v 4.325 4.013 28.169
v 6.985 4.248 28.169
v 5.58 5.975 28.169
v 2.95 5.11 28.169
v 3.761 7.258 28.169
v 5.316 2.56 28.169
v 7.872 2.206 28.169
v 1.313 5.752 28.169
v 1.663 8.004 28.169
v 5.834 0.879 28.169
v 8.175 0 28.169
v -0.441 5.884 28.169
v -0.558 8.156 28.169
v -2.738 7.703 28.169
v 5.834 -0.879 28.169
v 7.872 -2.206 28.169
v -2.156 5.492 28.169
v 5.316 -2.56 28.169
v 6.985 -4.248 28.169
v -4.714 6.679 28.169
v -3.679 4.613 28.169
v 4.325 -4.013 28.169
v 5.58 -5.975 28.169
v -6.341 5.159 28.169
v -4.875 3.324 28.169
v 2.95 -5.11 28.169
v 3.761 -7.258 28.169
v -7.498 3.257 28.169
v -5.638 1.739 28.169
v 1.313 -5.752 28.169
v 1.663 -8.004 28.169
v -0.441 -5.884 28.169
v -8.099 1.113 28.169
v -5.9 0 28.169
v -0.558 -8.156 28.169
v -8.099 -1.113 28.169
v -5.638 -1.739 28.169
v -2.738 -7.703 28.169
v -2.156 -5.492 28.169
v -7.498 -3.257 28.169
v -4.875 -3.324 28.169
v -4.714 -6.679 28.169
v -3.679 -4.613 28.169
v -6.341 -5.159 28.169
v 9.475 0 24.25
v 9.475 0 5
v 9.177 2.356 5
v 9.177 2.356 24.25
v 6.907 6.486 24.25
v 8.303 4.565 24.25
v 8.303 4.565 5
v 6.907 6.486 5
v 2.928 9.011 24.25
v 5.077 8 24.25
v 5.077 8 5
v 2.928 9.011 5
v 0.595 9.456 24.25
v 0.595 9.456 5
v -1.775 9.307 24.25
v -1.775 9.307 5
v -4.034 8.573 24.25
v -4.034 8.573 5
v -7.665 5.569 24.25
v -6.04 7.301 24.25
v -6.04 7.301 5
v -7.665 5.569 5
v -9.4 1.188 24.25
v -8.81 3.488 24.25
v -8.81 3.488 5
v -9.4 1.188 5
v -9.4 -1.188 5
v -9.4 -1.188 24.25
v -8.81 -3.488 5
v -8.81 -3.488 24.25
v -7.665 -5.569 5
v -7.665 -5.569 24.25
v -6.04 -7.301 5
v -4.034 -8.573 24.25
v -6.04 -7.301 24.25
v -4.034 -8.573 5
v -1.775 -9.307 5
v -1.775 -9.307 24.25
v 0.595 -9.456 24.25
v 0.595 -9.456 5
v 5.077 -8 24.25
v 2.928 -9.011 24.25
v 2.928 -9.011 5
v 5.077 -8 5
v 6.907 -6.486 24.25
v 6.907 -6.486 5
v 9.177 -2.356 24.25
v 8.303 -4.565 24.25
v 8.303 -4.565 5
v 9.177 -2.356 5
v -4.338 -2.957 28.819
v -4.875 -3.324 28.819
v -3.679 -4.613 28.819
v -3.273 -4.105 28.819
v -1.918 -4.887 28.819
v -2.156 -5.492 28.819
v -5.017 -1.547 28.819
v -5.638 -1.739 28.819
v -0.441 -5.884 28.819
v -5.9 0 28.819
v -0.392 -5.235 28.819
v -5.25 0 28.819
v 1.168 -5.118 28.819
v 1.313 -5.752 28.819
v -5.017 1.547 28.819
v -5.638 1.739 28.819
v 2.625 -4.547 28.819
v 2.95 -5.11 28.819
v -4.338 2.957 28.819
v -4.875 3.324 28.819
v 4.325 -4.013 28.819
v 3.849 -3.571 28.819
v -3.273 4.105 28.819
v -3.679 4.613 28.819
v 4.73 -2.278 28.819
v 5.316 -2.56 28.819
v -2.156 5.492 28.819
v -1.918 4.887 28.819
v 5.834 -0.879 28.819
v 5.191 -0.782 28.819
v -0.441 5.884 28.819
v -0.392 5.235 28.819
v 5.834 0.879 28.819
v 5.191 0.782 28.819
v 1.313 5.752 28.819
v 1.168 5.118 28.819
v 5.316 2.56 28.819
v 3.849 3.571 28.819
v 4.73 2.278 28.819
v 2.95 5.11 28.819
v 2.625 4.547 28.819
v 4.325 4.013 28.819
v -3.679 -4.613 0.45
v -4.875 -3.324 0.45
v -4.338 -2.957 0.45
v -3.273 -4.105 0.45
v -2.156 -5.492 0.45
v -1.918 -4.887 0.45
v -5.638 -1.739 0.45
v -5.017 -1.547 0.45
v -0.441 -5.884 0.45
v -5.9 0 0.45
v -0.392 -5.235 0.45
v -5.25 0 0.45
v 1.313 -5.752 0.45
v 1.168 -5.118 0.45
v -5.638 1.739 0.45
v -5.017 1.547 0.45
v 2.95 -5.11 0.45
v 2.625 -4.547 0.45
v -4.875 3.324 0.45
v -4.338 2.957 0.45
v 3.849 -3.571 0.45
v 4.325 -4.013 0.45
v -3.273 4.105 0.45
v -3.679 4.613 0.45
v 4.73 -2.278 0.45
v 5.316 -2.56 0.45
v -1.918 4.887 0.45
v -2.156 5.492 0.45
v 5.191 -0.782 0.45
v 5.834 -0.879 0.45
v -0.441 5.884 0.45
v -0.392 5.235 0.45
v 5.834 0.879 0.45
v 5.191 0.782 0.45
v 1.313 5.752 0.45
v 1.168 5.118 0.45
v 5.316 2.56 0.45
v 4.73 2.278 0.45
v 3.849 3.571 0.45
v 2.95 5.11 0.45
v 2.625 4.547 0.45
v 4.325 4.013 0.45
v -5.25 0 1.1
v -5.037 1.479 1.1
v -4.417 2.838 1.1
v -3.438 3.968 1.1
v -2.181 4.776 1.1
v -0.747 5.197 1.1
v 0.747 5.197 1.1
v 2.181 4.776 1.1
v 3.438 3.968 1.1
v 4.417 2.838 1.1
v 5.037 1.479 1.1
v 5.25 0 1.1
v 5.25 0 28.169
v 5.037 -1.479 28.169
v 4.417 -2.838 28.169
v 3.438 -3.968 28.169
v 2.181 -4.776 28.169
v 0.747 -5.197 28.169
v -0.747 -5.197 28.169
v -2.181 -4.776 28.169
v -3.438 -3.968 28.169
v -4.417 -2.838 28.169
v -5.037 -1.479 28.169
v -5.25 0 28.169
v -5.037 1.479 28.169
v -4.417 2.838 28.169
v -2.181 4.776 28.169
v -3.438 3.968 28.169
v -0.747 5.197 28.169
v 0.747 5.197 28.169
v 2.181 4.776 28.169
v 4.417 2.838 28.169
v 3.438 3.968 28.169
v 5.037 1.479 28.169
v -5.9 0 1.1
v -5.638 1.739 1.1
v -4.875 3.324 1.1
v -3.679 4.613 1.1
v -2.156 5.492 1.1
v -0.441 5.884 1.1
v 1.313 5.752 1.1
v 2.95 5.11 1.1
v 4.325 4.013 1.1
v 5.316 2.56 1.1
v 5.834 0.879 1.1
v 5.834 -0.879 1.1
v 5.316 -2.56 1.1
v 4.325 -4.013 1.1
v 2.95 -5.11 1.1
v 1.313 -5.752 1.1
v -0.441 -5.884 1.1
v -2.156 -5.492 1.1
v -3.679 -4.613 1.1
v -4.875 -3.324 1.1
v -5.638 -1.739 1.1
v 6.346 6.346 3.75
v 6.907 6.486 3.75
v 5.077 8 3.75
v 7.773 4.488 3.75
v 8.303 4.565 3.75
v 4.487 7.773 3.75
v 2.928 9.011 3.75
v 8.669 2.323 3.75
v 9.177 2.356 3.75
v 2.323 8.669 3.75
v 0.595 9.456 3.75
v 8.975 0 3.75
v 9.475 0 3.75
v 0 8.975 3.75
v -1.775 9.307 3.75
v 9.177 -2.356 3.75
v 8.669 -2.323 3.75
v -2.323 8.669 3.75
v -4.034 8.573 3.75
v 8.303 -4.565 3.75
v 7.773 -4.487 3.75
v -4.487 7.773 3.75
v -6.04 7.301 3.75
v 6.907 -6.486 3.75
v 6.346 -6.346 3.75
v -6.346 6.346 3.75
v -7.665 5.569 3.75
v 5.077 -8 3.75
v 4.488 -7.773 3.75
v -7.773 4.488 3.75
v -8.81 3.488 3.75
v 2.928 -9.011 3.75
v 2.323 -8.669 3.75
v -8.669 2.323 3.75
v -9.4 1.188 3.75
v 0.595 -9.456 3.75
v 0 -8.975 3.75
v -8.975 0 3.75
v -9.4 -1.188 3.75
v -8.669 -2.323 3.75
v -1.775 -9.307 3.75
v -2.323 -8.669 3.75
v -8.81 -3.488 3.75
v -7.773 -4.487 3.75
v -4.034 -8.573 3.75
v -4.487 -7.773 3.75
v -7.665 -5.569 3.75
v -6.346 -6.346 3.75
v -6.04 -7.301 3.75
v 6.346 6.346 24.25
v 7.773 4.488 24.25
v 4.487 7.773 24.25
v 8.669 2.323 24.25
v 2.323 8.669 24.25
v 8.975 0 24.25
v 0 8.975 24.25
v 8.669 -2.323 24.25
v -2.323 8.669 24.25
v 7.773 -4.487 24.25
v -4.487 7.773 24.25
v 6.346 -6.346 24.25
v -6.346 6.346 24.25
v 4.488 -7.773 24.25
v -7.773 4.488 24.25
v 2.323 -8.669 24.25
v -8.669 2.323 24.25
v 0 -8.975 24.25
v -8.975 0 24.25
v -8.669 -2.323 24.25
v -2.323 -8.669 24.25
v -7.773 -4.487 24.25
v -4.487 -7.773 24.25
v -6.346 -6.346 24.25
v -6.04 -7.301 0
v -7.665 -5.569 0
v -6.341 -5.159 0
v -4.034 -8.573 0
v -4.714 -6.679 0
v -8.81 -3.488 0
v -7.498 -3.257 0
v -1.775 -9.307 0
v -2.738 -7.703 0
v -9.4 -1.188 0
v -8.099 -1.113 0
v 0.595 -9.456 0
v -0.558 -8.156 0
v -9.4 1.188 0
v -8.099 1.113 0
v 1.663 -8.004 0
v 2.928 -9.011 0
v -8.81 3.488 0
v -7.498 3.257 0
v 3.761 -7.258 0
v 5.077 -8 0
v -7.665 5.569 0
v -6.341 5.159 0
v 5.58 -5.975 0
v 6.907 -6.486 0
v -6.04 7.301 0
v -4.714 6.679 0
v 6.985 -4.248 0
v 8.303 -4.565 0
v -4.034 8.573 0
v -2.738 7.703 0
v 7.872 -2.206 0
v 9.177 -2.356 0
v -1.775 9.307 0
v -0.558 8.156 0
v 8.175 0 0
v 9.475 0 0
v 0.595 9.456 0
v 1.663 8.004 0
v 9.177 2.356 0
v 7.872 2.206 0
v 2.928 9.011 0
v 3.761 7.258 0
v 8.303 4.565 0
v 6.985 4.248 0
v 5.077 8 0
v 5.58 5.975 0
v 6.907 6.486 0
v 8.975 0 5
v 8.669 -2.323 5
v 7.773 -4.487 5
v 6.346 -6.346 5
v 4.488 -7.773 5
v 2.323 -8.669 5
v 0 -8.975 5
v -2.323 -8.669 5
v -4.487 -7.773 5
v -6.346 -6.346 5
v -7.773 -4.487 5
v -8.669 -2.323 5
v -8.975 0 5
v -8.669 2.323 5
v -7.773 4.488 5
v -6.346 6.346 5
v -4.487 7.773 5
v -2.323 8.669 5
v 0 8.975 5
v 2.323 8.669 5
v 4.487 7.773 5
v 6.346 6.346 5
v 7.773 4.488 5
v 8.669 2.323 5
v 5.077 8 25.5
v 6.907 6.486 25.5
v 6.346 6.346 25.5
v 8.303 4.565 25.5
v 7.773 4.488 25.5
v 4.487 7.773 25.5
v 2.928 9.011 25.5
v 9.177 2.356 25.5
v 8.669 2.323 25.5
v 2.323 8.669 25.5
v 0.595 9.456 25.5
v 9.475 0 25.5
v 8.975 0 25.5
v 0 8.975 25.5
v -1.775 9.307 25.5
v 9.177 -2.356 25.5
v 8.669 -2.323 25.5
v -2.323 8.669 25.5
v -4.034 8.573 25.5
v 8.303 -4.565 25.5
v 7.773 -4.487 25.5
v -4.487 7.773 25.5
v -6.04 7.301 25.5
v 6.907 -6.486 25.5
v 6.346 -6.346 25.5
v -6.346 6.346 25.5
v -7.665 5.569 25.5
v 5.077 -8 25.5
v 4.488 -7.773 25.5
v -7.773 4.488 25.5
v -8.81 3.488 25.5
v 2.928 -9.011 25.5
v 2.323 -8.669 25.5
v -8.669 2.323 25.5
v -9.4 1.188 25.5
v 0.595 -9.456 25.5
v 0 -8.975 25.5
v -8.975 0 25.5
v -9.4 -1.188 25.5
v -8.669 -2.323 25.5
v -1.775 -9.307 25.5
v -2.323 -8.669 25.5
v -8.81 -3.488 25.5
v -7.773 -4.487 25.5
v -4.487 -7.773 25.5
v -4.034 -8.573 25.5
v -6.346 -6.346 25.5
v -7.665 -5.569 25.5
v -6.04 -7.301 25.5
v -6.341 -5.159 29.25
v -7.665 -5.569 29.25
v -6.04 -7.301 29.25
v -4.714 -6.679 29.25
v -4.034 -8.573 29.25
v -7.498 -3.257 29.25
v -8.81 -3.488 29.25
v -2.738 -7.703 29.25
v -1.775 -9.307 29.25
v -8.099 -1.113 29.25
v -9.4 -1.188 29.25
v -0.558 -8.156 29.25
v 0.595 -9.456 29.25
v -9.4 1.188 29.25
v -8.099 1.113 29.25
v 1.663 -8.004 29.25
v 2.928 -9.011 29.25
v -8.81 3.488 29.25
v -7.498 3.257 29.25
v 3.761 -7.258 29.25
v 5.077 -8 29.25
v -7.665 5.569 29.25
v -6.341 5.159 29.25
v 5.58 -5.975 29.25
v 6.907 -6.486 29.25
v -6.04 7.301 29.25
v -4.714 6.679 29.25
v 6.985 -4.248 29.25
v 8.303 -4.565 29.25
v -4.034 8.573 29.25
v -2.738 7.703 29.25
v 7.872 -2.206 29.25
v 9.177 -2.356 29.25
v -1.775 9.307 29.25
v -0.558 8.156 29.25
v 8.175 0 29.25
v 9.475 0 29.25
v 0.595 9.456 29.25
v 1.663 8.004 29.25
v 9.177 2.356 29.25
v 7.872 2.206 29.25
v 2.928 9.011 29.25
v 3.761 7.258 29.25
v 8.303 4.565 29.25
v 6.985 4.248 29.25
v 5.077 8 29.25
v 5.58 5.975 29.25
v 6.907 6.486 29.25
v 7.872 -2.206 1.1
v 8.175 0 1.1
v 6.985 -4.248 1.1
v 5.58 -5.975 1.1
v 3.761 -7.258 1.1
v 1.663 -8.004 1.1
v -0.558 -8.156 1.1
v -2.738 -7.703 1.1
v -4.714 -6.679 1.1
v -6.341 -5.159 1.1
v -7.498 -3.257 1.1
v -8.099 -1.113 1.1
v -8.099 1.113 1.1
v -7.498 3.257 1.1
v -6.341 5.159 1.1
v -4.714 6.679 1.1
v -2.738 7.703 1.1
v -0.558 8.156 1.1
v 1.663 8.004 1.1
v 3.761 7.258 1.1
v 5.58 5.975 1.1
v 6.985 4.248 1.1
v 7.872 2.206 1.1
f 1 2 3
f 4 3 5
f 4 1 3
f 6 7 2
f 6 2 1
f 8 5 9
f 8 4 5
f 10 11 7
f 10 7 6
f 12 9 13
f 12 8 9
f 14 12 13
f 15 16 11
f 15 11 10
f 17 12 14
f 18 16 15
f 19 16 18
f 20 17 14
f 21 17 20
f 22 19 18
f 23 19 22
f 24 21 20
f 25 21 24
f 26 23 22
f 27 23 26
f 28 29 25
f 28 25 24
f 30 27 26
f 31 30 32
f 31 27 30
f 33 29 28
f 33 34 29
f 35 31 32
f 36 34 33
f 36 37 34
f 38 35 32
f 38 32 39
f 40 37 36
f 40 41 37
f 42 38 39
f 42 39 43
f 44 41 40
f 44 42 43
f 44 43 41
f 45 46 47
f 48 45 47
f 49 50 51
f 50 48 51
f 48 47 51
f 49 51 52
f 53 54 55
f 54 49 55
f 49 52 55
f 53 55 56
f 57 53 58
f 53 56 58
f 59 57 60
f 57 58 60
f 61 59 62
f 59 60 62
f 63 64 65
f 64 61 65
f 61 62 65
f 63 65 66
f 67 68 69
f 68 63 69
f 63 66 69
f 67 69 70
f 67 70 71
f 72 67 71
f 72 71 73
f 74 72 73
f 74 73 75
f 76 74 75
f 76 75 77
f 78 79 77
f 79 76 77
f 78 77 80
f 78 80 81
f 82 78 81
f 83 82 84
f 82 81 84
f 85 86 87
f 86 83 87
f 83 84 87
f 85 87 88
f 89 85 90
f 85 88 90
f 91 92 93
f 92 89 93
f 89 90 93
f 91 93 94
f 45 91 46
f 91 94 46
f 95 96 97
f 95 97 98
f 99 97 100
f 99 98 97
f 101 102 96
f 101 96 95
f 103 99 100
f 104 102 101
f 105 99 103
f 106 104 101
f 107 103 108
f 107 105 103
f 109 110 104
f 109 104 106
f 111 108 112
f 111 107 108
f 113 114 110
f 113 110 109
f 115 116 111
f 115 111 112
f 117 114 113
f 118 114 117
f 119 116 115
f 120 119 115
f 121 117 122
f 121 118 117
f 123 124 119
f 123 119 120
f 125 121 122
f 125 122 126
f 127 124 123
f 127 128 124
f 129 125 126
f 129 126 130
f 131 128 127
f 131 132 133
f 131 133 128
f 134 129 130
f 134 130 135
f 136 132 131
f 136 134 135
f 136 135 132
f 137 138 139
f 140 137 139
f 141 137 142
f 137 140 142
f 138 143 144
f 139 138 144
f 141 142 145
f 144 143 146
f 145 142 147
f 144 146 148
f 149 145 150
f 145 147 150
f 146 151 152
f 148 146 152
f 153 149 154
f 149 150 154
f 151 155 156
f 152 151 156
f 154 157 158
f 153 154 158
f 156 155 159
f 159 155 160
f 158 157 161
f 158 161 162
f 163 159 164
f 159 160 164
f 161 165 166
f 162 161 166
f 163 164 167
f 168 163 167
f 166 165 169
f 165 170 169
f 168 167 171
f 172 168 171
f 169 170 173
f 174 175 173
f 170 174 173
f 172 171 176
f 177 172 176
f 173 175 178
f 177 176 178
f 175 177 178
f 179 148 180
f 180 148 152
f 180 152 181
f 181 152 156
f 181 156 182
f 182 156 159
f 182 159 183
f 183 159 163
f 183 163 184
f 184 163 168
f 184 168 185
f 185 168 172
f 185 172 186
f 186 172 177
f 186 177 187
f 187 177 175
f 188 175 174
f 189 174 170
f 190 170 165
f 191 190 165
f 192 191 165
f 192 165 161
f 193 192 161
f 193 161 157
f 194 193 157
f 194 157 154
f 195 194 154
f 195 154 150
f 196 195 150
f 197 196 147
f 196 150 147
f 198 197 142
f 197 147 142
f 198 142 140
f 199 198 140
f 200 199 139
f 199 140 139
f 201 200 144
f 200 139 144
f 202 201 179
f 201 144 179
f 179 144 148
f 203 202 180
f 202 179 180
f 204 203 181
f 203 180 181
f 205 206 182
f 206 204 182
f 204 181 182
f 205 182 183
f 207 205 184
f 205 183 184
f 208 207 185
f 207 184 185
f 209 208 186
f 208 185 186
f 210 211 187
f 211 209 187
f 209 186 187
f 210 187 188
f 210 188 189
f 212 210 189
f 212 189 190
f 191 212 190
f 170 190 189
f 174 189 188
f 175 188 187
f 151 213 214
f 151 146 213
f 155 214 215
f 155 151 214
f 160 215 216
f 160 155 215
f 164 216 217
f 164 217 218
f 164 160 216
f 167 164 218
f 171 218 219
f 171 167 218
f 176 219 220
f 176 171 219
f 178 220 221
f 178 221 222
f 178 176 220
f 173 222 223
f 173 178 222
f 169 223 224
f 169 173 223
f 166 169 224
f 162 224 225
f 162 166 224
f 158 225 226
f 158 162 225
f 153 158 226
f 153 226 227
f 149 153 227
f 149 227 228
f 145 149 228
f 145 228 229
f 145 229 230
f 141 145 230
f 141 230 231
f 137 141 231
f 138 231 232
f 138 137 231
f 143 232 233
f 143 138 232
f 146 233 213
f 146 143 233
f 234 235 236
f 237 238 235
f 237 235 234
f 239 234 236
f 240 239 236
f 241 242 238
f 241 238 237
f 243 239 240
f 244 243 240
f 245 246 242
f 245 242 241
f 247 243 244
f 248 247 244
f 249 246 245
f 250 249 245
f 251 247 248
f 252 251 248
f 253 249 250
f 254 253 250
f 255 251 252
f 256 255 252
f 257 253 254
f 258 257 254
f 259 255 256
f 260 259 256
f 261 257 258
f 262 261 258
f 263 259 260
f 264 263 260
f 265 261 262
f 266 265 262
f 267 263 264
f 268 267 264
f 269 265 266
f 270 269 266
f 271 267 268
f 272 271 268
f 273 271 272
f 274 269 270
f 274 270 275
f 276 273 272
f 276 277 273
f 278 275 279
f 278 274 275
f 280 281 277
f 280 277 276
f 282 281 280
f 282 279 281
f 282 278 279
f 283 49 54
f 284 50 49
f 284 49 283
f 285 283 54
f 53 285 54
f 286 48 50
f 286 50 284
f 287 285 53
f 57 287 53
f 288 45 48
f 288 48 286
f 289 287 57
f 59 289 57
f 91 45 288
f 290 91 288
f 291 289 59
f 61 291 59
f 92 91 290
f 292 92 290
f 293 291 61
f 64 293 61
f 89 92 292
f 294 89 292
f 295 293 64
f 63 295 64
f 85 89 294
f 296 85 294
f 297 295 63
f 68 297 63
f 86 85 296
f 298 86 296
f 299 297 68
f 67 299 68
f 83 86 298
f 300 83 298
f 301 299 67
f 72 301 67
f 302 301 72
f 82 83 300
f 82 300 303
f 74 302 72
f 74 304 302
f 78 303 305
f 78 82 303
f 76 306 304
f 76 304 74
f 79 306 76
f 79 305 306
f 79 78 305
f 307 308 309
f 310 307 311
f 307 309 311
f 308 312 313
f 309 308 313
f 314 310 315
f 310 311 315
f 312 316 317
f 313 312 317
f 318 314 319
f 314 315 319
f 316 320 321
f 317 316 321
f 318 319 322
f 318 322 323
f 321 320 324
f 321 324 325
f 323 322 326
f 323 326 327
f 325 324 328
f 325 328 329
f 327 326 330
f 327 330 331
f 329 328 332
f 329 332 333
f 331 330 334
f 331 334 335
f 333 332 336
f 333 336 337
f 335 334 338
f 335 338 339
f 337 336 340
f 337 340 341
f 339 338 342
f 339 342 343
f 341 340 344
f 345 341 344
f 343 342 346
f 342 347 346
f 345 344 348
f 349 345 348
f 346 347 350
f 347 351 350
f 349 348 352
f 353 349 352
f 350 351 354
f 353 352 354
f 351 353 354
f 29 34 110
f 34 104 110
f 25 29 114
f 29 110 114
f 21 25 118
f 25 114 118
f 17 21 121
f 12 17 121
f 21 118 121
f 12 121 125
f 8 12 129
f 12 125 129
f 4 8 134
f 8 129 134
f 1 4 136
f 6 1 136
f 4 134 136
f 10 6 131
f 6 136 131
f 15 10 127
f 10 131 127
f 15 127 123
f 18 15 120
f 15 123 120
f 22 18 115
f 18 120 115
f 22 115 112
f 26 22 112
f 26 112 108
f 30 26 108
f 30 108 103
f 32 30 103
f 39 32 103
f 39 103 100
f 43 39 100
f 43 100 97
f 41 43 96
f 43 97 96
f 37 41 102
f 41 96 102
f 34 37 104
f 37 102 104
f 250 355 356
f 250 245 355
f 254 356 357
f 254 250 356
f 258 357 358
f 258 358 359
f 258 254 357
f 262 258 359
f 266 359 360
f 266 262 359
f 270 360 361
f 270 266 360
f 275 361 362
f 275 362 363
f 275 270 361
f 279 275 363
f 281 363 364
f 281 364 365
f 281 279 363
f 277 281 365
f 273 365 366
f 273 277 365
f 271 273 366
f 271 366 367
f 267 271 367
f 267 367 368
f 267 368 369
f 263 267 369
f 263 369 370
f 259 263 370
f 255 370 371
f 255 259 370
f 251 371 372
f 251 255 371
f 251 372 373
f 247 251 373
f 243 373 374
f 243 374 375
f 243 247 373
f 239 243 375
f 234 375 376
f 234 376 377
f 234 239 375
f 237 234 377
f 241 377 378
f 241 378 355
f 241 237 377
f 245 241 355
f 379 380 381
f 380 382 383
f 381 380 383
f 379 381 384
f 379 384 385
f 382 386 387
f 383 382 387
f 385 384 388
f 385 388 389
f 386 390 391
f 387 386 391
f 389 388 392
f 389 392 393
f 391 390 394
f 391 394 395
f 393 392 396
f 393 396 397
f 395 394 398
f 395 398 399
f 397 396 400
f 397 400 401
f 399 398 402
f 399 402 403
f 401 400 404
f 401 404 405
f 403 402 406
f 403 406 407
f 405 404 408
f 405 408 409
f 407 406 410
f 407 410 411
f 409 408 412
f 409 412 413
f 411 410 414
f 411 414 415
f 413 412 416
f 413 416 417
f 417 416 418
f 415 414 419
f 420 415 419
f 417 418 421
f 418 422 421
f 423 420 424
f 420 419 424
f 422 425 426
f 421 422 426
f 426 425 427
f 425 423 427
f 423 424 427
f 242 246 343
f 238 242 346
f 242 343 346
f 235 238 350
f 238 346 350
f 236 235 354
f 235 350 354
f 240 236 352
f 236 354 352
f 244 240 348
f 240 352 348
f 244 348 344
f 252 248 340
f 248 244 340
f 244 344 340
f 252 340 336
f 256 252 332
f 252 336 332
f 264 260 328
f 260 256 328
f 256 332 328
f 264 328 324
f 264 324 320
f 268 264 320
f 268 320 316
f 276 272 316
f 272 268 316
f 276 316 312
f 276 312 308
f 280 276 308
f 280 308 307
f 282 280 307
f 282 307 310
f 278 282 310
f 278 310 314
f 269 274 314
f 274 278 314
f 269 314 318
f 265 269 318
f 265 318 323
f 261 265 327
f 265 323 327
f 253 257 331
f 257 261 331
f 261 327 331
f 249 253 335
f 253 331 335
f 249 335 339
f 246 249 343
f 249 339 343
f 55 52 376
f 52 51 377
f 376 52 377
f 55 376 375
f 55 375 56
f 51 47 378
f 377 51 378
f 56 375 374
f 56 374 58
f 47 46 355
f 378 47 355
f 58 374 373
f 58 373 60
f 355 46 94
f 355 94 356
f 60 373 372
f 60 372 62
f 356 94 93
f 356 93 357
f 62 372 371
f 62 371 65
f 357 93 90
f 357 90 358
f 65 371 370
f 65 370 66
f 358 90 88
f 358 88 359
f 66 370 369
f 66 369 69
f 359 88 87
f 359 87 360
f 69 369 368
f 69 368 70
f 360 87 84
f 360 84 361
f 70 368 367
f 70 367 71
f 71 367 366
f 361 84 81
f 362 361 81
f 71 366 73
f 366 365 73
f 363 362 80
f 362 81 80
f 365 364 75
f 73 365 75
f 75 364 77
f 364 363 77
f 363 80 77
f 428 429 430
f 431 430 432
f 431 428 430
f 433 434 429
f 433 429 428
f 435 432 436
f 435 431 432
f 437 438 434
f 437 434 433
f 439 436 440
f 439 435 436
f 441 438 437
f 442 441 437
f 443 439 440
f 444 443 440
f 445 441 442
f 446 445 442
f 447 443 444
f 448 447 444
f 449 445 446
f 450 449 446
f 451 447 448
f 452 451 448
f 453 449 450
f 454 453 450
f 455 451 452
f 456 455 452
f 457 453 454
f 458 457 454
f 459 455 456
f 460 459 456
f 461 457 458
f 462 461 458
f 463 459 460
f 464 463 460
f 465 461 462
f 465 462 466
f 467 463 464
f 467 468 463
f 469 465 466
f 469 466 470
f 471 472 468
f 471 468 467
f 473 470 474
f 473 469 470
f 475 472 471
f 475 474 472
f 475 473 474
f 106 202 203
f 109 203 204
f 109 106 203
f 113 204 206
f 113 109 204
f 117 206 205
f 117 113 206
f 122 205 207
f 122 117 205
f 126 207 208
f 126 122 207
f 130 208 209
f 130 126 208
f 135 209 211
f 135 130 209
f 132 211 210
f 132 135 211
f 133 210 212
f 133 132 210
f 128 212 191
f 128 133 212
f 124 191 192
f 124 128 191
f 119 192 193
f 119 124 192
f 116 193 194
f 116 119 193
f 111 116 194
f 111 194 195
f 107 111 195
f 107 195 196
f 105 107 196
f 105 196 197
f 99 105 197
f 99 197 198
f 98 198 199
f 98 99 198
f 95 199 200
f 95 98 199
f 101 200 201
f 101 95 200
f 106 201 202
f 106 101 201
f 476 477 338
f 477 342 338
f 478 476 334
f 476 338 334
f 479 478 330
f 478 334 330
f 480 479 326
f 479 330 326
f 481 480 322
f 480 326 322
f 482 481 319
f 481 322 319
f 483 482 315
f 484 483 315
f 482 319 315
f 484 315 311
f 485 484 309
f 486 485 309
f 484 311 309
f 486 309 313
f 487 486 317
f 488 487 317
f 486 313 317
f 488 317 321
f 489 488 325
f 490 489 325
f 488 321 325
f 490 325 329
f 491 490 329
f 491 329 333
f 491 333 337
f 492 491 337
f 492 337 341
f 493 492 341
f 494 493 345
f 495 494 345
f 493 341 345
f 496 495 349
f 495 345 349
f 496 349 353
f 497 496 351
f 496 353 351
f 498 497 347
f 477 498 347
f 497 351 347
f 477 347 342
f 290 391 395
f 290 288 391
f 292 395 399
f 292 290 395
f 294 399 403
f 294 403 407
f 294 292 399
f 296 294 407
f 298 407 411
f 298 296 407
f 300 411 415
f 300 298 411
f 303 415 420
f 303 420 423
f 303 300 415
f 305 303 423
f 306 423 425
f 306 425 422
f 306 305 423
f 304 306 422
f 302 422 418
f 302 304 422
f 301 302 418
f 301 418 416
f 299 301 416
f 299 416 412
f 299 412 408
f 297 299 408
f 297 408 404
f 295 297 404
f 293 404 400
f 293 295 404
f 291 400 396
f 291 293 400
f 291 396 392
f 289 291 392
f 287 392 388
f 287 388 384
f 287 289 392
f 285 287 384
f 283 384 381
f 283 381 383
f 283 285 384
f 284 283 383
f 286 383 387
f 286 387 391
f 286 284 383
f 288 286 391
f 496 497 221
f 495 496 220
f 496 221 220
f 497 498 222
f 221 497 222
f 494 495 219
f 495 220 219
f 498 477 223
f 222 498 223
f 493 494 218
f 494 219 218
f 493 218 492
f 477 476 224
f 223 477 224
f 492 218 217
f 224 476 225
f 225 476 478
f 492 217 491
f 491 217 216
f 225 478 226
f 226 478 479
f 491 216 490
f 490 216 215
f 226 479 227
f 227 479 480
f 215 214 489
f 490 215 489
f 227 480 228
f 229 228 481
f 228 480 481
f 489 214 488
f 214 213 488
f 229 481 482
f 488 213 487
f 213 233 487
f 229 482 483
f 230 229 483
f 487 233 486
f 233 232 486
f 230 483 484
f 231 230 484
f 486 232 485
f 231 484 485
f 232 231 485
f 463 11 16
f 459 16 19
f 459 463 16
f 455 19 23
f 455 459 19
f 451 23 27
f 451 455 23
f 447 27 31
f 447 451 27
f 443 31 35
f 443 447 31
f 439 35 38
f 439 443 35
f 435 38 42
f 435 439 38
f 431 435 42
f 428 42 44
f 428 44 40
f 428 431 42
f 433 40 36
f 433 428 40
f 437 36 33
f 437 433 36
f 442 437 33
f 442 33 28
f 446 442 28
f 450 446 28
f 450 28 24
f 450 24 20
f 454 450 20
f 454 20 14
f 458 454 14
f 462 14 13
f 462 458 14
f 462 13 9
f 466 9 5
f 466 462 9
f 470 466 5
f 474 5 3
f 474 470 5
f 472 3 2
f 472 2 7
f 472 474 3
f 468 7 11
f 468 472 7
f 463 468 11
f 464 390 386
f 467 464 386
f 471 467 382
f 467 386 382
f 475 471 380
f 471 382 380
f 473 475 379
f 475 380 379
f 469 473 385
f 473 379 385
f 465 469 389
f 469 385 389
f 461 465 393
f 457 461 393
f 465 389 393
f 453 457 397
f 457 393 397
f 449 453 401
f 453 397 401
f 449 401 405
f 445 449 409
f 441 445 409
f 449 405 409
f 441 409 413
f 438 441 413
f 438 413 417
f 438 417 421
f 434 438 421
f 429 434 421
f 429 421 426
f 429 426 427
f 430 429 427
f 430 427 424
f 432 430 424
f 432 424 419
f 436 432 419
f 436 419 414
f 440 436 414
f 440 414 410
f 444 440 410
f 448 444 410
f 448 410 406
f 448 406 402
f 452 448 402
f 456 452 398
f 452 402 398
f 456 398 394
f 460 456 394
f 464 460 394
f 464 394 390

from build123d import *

# Parameters (mm, degrees)
SKETCH1_R                    = 9.475
BOSS_EXTRUDE1_DEPTH          = 29.25
SKETCH2_W                    = 0.5
SKETCH2_H                    = 1.25
SKETCH3_W                    = 8.175
SKETCH3_H                    = 1.1
F_10_5_10_5_DIAMETER_HOLE1_D = 10.5
SKETCH10_W                   = 0.65
SKETCH10_H                   = 0.65


with BuildPart() as part:
    # Sketch1 → Boss-Extrude1 (new body)
    with BuildSketch(Plane.XY):
        Circle(SKETCH1_R)
    extrude(amount=BOSS_EXTRUDE1_DEPTH)

    # Sketch2 → Cut-Revolve1 (revolve, cut)
    with BuildSketch(Plane(origin=(0, 0, 0), x_dir=(1, 0, 0), z_dir=(0, 1, 0))):
        with Locations((9.225, -4.375)):
            Rectangle(SKETCH2_W, SKETCH2_H)
        with Locations((9.225, -24.875)):
            Rectangle(SKETCH2_W, SKETCH2_H)
    revolve(axis=Axis((0, 0, 29.25), (0, 0, -1)), mode=Mode.SUBTRACT)

    # Sketch3 → Cut-Revolve2 (revolve, cut)
    with BuildSketch(Plane(origin=(0, 0, 0), x_dir=(1, 0, 0), z_dir=(0, 1, 0))):
        with Locations((4.0875, -0.55)):
            Rectangle(SKETCH3_W, SKETCH3_H)
    cut_revolve2 = revolve(axis=Axis((0, 0, 29.25), (0, 0, -1)), mode=Mode.SUBTRACT)

    # Mirror1: Cut-Revolve2 across plane
    add(cut_revolve2.mirror(Plane.XY.offset(14.634530548)), mode=Mode.SUBTRACT)

    # Ø10.5 (10.5) Diameter Hole1 (through all)
    with Locations(Plane(origin=(0, 0, 1.1), x_dir=(-1, 0, 0), z_dir=(0, 0, -1))):
        with Locations((0, 0)):
            Hole(F_10_5_10_5_DIAMETER_HOLE1_D / 2)

    # Sketch10 → Revolve1 (revolve)
    with BuildSketch(Plane(origin=(0, 0, 0), x_dir=(0, 0, -1), z_dir=(1, 0, 0)), mode=Mode.PRIVATE) as revolve1_sk:
        with Locations((-0.775, 5.575)):
            Rectangle(SKETCH10_W, SKETCH10_H)
    revolve1 = revolve(revolve1_sk.sketch.rotate(Axis((0, 0, 29.269061095), (0, 0, -1)), 270), axis=Axis((0, 0, 29.269061095), (0, 0, -1)))

    # Mirror2: Revolve1 across plane
    add(revolve1.mirror(Plane.XY.offset(14.634530548)))


solid = part.part
